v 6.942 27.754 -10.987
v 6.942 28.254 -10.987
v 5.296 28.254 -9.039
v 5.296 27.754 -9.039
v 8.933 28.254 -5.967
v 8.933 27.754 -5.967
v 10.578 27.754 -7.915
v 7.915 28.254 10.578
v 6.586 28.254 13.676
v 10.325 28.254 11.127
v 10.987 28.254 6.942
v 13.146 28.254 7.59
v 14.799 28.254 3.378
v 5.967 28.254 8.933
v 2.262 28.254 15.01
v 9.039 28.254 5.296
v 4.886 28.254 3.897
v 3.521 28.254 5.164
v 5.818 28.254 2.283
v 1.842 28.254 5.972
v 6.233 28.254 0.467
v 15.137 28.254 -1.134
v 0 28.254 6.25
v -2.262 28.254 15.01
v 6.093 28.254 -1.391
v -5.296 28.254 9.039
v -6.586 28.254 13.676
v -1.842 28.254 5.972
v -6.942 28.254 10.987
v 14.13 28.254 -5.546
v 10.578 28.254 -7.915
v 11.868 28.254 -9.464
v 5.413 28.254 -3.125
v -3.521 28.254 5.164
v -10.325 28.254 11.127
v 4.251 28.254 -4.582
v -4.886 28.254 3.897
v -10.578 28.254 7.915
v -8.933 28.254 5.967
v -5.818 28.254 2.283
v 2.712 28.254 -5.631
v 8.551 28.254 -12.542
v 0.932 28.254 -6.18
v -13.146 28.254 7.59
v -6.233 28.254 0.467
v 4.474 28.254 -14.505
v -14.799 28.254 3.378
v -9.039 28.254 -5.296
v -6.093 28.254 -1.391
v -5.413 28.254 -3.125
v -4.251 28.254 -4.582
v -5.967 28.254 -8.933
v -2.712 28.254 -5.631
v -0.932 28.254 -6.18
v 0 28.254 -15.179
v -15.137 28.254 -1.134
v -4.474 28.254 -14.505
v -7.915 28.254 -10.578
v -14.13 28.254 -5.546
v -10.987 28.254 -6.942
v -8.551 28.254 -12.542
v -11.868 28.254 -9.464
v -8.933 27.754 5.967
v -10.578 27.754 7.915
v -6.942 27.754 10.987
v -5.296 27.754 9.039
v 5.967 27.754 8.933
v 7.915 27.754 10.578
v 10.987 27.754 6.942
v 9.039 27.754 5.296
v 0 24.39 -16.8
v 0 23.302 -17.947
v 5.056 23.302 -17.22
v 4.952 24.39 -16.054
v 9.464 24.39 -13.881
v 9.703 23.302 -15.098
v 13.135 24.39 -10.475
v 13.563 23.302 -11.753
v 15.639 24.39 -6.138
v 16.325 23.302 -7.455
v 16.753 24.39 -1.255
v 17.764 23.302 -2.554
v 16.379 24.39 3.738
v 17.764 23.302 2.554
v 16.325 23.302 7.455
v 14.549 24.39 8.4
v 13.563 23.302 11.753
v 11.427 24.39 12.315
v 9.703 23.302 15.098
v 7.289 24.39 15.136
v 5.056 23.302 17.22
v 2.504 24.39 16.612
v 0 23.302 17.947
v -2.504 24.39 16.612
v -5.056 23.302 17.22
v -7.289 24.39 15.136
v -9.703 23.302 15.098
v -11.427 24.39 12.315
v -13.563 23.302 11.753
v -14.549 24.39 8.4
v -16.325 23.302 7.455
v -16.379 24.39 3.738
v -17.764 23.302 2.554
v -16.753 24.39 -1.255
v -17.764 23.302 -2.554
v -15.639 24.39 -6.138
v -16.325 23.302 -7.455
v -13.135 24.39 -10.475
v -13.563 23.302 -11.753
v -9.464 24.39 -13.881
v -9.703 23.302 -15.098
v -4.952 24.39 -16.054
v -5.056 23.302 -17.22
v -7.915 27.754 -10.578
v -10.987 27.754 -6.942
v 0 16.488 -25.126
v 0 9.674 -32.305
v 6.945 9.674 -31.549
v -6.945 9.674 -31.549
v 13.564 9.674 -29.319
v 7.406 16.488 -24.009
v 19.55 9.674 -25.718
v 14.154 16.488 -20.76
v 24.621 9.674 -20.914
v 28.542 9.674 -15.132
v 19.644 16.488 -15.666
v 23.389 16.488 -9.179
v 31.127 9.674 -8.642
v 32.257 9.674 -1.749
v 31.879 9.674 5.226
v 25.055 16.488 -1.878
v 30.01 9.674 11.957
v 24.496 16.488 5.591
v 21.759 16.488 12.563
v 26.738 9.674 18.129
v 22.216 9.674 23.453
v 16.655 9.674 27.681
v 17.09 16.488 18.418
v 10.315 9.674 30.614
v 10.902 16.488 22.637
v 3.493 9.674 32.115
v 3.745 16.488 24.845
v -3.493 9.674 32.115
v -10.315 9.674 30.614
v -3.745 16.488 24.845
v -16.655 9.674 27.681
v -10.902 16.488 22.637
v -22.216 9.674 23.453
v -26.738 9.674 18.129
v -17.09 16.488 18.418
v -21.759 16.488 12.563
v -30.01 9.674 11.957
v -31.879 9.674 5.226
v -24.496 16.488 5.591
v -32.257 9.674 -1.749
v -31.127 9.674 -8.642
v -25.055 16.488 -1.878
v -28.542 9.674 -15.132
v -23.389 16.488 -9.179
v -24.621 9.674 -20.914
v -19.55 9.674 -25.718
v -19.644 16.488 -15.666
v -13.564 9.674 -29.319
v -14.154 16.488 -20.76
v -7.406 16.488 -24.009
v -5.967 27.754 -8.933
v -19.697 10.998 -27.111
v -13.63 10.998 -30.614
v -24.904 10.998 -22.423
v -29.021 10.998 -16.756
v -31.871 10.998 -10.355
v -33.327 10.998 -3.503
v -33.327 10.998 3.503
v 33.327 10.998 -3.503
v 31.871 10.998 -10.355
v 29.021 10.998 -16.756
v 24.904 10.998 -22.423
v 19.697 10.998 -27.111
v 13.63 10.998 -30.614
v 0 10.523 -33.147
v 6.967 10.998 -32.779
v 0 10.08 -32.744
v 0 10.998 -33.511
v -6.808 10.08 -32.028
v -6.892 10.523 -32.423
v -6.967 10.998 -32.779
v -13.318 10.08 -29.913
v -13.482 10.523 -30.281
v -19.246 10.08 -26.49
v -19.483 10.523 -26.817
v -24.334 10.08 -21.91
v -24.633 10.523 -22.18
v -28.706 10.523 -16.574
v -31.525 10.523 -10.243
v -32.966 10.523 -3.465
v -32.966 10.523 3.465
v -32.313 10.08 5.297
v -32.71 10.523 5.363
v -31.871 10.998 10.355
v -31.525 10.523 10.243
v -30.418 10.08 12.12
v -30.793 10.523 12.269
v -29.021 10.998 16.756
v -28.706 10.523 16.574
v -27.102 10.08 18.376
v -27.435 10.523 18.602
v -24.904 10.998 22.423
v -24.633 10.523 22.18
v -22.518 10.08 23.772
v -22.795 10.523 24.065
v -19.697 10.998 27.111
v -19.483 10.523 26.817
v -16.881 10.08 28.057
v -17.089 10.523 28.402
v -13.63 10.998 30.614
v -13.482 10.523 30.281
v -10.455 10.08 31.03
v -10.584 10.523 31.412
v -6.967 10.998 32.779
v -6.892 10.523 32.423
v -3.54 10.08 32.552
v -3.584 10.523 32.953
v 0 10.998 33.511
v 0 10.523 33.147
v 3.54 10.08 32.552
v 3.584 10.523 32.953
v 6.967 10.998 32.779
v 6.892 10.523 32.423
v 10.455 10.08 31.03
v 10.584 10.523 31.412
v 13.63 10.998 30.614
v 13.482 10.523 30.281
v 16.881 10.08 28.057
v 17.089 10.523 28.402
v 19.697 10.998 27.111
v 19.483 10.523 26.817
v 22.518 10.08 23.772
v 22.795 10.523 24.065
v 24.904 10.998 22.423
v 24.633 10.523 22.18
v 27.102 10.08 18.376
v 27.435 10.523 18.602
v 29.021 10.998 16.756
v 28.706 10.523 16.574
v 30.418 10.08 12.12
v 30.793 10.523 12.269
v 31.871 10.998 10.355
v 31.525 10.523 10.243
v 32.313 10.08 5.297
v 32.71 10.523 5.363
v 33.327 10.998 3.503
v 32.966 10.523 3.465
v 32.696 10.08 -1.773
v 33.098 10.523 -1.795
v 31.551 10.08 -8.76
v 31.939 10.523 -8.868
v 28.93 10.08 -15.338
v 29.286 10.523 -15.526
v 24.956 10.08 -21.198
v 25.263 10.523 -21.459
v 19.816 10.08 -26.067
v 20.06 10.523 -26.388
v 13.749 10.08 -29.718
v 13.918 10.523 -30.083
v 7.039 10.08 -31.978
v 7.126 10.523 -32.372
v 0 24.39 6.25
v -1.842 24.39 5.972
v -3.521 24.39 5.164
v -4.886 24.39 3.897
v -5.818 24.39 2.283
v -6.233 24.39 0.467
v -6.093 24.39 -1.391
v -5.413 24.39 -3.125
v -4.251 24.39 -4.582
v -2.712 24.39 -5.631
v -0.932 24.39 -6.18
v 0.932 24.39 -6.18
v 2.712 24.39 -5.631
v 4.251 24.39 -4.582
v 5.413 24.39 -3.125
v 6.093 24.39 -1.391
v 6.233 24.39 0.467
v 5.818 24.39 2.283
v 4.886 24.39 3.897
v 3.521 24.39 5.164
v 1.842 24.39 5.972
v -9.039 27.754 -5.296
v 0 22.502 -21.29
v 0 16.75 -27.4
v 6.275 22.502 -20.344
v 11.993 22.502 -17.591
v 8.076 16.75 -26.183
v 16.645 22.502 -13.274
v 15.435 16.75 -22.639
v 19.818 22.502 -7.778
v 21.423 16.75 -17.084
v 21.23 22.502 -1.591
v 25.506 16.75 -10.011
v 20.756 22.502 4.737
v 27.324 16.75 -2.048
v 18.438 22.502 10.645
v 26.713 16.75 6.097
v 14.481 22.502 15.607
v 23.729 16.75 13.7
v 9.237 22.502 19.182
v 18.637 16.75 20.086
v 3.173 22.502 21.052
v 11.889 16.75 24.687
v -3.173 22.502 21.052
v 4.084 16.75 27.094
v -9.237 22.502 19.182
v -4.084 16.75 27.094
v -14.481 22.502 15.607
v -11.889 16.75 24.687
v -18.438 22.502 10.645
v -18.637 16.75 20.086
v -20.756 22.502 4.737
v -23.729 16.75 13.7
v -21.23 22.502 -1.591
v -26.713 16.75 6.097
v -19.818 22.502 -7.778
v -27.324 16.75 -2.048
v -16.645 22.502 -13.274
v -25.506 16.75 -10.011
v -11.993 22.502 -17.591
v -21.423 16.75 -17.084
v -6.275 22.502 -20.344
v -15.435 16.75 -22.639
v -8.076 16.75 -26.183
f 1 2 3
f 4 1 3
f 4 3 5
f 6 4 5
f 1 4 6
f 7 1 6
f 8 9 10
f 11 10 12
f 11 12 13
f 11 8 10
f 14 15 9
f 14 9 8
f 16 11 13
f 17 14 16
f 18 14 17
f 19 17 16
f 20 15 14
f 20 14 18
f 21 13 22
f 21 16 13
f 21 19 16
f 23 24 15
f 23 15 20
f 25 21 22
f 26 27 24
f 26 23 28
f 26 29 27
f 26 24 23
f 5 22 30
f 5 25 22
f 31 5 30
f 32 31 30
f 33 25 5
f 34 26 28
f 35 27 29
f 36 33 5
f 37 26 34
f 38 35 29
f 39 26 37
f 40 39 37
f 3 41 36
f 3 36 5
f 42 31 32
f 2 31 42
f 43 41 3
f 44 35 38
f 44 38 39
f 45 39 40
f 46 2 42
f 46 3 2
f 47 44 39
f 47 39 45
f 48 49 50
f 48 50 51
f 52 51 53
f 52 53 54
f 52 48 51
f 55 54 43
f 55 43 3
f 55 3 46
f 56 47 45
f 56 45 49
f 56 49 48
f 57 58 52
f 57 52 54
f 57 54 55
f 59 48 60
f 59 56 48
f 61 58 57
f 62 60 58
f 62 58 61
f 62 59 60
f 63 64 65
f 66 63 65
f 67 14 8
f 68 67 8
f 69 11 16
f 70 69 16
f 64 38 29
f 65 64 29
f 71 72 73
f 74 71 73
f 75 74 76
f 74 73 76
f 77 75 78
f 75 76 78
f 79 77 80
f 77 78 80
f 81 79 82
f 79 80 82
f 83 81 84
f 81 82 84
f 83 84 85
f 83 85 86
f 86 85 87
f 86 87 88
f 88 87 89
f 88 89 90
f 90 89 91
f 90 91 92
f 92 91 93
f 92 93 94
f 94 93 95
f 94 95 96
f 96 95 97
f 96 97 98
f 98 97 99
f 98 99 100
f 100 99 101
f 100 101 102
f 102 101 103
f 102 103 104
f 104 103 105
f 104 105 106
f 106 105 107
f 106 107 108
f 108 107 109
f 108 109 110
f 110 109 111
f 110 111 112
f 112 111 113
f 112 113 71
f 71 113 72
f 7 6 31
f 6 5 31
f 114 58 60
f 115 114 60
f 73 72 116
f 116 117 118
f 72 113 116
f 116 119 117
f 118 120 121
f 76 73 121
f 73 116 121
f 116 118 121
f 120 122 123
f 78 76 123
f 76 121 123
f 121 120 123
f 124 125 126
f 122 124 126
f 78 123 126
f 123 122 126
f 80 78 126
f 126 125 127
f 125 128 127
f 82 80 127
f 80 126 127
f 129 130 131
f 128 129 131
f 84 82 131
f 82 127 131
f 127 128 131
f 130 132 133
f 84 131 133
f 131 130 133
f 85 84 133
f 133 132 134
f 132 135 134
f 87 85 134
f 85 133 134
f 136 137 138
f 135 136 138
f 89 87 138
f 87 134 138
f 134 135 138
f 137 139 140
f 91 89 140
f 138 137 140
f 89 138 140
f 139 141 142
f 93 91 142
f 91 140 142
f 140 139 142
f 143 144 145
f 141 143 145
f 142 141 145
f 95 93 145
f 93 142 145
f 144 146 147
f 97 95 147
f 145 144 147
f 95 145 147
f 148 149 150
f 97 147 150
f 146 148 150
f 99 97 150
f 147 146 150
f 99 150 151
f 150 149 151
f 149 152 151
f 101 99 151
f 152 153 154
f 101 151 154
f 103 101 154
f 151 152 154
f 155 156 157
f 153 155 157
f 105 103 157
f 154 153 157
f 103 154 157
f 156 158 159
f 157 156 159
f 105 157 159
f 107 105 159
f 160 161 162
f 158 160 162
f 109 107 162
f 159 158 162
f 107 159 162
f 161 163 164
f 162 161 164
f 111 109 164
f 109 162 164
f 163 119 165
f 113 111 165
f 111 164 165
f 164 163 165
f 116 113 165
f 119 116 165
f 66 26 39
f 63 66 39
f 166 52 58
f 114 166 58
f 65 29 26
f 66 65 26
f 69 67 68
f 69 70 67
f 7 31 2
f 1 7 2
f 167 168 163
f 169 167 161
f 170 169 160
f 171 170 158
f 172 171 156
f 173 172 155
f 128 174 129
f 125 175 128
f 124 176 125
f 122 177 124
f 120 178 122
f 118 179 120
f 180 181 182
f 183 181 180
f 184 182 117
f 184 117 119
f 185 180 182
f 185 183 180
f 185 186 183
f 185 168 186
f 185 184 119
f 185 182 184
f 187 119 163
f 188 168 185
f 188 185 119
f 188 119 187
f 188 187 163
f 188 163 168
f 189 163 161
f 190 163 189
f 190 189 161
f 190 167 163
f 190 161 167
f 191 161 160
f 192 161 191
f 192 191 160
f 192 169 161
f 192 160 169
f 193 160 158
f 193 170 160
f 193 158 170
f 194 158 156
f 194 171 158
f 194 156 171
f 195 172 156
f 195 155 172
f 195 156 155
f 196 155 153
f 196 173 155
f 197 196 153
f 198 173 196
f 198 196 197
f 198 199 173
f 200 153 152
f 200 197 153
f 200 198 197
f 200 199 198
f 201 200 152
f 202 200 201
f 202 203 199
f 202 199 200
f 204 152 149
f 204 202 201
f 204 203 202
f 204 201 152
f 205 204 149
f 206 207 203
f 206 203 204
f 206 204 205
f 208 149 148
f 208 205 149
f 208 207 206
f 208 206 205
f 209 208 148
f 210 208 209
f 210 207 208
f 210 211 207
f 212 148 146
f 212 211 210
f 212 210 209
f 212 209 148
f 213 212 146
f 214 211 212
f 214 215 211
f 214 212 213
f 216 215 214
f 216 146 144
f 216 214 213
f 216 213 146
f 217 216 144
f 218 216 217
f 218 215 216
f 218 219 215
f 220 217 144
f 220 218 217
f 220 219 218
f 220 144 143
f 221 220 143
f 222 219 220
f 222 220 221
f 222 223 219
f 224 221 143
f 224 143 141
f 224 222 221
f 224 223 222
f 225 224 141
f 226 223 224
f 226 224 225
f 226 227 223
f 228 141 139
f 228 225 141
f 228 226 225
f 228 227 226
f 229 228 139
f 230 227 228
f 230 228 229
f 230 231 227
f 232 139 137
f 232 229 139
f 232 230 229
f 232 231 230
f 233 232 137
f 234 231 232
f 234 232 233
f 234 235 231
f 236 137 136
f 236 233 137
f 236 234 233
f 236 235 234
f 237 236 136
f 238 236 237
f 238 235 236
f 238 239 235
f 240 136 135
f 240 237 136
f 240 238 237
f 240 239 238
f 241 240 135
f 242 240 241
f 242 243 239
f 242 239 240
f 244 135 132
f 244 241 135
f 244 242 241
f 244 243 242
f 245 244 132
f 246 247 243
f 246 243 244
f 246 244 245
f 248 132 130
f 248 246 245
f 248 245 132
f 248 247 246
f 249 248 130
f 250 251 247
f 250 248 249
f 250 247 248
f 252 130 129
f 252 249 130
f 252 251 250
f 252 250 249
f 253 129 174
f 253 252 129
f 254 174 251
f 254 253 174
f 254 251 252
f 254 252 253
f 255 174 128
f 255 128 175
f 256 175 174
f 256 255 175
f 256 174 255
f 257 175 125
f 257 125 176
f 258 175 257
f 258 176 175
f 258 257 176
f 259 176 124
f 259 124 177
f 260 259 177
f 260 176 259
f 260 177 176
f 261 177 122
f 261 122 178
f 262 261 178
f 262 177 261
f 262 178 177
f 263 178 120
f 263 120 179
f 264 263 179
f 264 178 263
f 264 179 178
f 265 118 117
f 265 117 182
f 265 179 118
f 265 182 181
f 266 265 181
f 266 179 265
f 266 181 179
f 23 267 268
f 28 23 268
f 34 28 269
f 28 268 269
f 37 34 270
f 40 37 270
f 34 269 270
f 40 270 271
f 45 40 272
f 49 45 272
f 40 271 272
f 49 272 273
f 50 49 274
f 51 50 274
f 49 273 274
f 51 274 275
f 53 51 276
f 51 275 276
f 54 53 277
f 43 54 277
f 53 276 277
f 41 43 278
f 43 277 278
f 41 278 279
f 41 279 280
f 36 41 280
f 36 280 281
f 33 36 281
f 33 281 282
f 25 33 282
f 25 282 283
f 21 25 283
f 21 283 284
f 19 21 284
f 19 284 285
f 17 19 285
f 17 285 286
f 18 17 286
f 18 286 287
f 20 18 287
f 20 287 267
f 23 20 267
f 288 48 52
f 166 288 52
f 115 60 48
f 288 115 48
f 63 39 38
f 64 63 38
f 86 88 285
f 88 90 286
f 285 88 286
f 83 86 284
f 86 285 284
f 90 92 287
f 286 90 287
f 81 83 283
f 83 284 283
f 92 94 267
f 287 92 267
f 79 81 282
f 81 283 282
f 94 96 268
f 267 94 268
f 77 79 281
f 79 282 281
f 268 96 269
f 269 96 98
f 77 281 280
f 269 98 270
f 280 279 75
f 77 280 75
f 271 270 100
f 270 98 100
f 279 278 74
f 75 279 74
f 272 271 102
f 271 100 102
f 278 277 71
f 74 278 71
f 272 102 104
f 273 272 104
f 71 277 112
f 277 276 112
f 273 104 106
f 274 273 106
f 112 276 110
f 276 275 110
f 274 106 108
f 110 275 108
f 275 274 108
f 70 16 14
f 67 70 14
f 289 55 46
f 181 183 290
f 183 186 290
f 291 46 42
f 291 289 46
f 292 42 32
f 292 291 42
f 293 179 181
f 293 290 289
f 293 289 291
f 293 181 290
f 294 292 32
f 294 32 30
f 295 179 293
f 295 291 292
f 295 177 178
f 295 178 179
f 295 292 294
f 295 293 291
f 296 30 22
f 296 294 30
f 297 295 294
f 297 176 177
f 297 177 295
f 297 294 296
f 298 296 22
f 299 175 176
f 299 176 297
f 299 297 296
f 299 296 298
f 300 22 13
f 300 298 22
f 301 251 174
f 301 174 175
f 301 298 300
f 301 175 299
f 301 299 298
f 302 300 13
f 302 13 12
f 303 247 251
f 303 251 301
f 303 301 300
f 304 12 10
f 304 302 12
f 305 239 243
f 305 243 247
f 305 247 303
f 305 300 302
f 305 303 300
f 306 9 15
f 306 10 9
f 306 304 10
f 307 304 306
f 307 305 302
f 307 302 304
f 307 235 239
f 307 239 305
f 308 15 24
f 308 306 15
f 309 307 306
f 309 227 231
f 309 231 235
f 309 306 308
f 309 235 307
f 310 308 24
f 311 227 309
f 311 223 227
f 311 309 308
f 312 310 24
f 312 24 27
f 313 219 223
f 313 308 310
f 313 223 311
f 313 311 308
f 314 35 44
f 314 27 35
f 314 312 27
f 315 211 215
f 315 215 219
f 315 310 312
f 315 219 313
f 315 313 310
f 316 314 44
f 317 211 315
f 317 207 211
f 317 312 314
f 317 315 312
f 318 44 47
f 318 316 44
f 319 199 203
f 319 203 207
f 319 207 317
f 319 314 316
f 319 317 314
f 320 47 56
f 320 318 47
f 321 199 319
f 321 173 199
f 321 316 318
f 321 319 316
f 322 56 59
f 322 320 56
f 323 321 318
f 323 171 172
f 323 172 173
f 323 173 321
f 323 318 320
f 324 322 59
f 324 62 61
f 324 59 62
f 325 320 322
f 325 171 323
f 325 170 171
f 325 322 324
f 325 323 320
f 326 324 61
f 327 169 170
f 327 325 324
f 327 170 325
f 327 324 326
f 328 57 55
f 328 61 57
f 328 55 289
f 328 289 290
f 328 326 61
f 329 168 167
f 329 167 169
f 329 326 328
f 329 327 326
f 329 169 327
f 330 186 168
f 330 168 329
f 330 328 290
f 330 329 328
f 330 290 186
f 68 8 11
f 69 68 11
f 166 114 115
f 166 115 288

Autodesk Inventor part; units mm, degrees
ref_plane "YZ Plane" through (0, 0, 0) normal (1, 0, 0) x (0, 1, 0)
ref_plane "XZ Plane" through (0, 0, 0) normal (0, 1, 0) x (-1, 0, 0)
ref_plane "XY Plane" through (0, 0, 0) normal (0, 0, 1) x (1, 0, 0)
sketch "Sketch1" plane through (0, 0, 0) normal (1, 0, 0) x (0, 1, 0)
  line L0 (9.0511, -31.5552) -> (23.3, -16.54)
  line L1 (23.3, -16.54) -> (23.3033, -19.3531)
  line L2 (10.3088, -33.0443) -> (23.3033, -19.3531)
  arc A0 (9.0511, -31.5552) -> (10.3088, -33.0443) centre (56.5754, 7.3116) ccw
  line L3 (9.674, -32.3047) -> (23.3017, -17.9466)
  line L4 (0, 0) -> (23.3, 0)
  line L5 (0, 0) -> (25.6397, 0)
  line L6 (23.3, 0) -> (23.3, -16.54)
  line L7 (23.3, -16.54) -> (15.899, -24.339)
  line L8 (23.3033, -19.3531) -> (25.6397, -16.8915)
  line L9 (23.3, 0) -> (24.3897, 0)
  line L10 (24.3897, 0) -> (24.3897, -16.8)
  line L11 (23.3017, -17.9466) -> (24.3897, -16.8)
  line L12 (25.6397, 0) -> (25.6397, -16.8915)
  line L13 (25.6397, 0) -> (28.254, 0)
  line L14 (28.254, 0) -> (28.254, -15.1793)
  line L15 (28.254, -15.1793) -> (10.9078, -33.6064)
  arc A1 (10.3088, -33.0443) -> (10.9078, -33.6064) centre (31.8453, -10.6914) ccw
  arc A2 (9.674, -32.3047) -> (10.9976, -33.511) centre (15.0193, -27.7689) ccw
  dimension "d0" = 23.3
  dimension "d1" = 16.54
  dimension "d2" = 18.8761
  dimension "d3" = 20.7
  dimension "d4" = 61.3938
  dimension "d5" = 2.8131
  dimension "d6" = 136.5
  dimension "d18" = 16.8
  dimension "d19" = 1.25
  dimension "d22" = 0.9746
  dimension "d25" = 1.9491
revolve "Revolution1" add sketch "Sketch1" angle 360 about axis through (0, 0, 0) along (0, 1, 0) contours L3 L1 L2 A2 | L11 L10 L5 L12 L8 L1 | L2 L8 L12 L13 L14 L15 A2
sketch "Sketch3" plane through (0, 28.254, 0) normal (0, 1, 0) x (1, 0, 0)
  point P0 (0, 0)
hole "Hole2" at (0, 28.254, 0) direction (0, -1, 0) diameter 12.5 end through all
sketch "Sketch4" plane through (0, 28.254, 0) normal (0, 1, 0) x (1, 0, 0)
  line L0 (-5.9666, 8.9326) -> (-7.9148, 10.5784)
  line L1 (-7.9148, 10.5784) -> (-10.9871, 6.9417)
  line L2 (-10.9871, 6.9417) -> (-9.0388, 5.2958)
  line L3 (-9.0388, 5.2958) -> (-5.9666, 8.9326)
  line L4 (-6.9417, -10.9871) -> (-5.2958, -9.0388)
  line L5 (-8.9326, -5.9666) -> (-10.5784, -7.9148)
  line L6 (-10.5784, -7.9148) -> (-6.9417, -10.9871)
  line L7 (-5.2958, -9.0388) -> (-8.9326, -5.9666)
  line L8 (10.9871, -6.9417) -> (9.0388, -5.2958)
  line L9 (5.9666, -8.9326) -> (7.9148, -10.5784)
  line L10 (7.9148, -10.5784) -> (10.9871, -6.9417)
  line L11 (9.0388, -5.2958) -> (5.9666, -8.9326)
  line L12 (6.9417, 10.9871) -> (5.2958, 9.0388)
  line L13 (8.9326, 5.9666) -> (10.5784, 7.9148)
  line L14 (10.5784, 7.9148) -> (6.9417, 10.9871)
  line L15 (5.2958, 9.0388) -> (8.9326, 5.9666)
  point P0 (0, 0)
  point P1 (-10.0129, 6.1188)
  point P2 (-6.1188, -10.0129)
  point P3 (10.0129, -6.1188)
  point P4 (6.1188, 10.0129)
  dimension "d33" = 4.7607
  dimension "d34" = 2.5504
  dimension "d35" = 5.2958
  dimension "d36" = 9.0388
  dimension "d37" = 6.1188
  dimension "d40" = 360
extrude "Extrusion1" cut sketch "Sketch4" against normal blind 0.5
properties part number "Back Cover"
